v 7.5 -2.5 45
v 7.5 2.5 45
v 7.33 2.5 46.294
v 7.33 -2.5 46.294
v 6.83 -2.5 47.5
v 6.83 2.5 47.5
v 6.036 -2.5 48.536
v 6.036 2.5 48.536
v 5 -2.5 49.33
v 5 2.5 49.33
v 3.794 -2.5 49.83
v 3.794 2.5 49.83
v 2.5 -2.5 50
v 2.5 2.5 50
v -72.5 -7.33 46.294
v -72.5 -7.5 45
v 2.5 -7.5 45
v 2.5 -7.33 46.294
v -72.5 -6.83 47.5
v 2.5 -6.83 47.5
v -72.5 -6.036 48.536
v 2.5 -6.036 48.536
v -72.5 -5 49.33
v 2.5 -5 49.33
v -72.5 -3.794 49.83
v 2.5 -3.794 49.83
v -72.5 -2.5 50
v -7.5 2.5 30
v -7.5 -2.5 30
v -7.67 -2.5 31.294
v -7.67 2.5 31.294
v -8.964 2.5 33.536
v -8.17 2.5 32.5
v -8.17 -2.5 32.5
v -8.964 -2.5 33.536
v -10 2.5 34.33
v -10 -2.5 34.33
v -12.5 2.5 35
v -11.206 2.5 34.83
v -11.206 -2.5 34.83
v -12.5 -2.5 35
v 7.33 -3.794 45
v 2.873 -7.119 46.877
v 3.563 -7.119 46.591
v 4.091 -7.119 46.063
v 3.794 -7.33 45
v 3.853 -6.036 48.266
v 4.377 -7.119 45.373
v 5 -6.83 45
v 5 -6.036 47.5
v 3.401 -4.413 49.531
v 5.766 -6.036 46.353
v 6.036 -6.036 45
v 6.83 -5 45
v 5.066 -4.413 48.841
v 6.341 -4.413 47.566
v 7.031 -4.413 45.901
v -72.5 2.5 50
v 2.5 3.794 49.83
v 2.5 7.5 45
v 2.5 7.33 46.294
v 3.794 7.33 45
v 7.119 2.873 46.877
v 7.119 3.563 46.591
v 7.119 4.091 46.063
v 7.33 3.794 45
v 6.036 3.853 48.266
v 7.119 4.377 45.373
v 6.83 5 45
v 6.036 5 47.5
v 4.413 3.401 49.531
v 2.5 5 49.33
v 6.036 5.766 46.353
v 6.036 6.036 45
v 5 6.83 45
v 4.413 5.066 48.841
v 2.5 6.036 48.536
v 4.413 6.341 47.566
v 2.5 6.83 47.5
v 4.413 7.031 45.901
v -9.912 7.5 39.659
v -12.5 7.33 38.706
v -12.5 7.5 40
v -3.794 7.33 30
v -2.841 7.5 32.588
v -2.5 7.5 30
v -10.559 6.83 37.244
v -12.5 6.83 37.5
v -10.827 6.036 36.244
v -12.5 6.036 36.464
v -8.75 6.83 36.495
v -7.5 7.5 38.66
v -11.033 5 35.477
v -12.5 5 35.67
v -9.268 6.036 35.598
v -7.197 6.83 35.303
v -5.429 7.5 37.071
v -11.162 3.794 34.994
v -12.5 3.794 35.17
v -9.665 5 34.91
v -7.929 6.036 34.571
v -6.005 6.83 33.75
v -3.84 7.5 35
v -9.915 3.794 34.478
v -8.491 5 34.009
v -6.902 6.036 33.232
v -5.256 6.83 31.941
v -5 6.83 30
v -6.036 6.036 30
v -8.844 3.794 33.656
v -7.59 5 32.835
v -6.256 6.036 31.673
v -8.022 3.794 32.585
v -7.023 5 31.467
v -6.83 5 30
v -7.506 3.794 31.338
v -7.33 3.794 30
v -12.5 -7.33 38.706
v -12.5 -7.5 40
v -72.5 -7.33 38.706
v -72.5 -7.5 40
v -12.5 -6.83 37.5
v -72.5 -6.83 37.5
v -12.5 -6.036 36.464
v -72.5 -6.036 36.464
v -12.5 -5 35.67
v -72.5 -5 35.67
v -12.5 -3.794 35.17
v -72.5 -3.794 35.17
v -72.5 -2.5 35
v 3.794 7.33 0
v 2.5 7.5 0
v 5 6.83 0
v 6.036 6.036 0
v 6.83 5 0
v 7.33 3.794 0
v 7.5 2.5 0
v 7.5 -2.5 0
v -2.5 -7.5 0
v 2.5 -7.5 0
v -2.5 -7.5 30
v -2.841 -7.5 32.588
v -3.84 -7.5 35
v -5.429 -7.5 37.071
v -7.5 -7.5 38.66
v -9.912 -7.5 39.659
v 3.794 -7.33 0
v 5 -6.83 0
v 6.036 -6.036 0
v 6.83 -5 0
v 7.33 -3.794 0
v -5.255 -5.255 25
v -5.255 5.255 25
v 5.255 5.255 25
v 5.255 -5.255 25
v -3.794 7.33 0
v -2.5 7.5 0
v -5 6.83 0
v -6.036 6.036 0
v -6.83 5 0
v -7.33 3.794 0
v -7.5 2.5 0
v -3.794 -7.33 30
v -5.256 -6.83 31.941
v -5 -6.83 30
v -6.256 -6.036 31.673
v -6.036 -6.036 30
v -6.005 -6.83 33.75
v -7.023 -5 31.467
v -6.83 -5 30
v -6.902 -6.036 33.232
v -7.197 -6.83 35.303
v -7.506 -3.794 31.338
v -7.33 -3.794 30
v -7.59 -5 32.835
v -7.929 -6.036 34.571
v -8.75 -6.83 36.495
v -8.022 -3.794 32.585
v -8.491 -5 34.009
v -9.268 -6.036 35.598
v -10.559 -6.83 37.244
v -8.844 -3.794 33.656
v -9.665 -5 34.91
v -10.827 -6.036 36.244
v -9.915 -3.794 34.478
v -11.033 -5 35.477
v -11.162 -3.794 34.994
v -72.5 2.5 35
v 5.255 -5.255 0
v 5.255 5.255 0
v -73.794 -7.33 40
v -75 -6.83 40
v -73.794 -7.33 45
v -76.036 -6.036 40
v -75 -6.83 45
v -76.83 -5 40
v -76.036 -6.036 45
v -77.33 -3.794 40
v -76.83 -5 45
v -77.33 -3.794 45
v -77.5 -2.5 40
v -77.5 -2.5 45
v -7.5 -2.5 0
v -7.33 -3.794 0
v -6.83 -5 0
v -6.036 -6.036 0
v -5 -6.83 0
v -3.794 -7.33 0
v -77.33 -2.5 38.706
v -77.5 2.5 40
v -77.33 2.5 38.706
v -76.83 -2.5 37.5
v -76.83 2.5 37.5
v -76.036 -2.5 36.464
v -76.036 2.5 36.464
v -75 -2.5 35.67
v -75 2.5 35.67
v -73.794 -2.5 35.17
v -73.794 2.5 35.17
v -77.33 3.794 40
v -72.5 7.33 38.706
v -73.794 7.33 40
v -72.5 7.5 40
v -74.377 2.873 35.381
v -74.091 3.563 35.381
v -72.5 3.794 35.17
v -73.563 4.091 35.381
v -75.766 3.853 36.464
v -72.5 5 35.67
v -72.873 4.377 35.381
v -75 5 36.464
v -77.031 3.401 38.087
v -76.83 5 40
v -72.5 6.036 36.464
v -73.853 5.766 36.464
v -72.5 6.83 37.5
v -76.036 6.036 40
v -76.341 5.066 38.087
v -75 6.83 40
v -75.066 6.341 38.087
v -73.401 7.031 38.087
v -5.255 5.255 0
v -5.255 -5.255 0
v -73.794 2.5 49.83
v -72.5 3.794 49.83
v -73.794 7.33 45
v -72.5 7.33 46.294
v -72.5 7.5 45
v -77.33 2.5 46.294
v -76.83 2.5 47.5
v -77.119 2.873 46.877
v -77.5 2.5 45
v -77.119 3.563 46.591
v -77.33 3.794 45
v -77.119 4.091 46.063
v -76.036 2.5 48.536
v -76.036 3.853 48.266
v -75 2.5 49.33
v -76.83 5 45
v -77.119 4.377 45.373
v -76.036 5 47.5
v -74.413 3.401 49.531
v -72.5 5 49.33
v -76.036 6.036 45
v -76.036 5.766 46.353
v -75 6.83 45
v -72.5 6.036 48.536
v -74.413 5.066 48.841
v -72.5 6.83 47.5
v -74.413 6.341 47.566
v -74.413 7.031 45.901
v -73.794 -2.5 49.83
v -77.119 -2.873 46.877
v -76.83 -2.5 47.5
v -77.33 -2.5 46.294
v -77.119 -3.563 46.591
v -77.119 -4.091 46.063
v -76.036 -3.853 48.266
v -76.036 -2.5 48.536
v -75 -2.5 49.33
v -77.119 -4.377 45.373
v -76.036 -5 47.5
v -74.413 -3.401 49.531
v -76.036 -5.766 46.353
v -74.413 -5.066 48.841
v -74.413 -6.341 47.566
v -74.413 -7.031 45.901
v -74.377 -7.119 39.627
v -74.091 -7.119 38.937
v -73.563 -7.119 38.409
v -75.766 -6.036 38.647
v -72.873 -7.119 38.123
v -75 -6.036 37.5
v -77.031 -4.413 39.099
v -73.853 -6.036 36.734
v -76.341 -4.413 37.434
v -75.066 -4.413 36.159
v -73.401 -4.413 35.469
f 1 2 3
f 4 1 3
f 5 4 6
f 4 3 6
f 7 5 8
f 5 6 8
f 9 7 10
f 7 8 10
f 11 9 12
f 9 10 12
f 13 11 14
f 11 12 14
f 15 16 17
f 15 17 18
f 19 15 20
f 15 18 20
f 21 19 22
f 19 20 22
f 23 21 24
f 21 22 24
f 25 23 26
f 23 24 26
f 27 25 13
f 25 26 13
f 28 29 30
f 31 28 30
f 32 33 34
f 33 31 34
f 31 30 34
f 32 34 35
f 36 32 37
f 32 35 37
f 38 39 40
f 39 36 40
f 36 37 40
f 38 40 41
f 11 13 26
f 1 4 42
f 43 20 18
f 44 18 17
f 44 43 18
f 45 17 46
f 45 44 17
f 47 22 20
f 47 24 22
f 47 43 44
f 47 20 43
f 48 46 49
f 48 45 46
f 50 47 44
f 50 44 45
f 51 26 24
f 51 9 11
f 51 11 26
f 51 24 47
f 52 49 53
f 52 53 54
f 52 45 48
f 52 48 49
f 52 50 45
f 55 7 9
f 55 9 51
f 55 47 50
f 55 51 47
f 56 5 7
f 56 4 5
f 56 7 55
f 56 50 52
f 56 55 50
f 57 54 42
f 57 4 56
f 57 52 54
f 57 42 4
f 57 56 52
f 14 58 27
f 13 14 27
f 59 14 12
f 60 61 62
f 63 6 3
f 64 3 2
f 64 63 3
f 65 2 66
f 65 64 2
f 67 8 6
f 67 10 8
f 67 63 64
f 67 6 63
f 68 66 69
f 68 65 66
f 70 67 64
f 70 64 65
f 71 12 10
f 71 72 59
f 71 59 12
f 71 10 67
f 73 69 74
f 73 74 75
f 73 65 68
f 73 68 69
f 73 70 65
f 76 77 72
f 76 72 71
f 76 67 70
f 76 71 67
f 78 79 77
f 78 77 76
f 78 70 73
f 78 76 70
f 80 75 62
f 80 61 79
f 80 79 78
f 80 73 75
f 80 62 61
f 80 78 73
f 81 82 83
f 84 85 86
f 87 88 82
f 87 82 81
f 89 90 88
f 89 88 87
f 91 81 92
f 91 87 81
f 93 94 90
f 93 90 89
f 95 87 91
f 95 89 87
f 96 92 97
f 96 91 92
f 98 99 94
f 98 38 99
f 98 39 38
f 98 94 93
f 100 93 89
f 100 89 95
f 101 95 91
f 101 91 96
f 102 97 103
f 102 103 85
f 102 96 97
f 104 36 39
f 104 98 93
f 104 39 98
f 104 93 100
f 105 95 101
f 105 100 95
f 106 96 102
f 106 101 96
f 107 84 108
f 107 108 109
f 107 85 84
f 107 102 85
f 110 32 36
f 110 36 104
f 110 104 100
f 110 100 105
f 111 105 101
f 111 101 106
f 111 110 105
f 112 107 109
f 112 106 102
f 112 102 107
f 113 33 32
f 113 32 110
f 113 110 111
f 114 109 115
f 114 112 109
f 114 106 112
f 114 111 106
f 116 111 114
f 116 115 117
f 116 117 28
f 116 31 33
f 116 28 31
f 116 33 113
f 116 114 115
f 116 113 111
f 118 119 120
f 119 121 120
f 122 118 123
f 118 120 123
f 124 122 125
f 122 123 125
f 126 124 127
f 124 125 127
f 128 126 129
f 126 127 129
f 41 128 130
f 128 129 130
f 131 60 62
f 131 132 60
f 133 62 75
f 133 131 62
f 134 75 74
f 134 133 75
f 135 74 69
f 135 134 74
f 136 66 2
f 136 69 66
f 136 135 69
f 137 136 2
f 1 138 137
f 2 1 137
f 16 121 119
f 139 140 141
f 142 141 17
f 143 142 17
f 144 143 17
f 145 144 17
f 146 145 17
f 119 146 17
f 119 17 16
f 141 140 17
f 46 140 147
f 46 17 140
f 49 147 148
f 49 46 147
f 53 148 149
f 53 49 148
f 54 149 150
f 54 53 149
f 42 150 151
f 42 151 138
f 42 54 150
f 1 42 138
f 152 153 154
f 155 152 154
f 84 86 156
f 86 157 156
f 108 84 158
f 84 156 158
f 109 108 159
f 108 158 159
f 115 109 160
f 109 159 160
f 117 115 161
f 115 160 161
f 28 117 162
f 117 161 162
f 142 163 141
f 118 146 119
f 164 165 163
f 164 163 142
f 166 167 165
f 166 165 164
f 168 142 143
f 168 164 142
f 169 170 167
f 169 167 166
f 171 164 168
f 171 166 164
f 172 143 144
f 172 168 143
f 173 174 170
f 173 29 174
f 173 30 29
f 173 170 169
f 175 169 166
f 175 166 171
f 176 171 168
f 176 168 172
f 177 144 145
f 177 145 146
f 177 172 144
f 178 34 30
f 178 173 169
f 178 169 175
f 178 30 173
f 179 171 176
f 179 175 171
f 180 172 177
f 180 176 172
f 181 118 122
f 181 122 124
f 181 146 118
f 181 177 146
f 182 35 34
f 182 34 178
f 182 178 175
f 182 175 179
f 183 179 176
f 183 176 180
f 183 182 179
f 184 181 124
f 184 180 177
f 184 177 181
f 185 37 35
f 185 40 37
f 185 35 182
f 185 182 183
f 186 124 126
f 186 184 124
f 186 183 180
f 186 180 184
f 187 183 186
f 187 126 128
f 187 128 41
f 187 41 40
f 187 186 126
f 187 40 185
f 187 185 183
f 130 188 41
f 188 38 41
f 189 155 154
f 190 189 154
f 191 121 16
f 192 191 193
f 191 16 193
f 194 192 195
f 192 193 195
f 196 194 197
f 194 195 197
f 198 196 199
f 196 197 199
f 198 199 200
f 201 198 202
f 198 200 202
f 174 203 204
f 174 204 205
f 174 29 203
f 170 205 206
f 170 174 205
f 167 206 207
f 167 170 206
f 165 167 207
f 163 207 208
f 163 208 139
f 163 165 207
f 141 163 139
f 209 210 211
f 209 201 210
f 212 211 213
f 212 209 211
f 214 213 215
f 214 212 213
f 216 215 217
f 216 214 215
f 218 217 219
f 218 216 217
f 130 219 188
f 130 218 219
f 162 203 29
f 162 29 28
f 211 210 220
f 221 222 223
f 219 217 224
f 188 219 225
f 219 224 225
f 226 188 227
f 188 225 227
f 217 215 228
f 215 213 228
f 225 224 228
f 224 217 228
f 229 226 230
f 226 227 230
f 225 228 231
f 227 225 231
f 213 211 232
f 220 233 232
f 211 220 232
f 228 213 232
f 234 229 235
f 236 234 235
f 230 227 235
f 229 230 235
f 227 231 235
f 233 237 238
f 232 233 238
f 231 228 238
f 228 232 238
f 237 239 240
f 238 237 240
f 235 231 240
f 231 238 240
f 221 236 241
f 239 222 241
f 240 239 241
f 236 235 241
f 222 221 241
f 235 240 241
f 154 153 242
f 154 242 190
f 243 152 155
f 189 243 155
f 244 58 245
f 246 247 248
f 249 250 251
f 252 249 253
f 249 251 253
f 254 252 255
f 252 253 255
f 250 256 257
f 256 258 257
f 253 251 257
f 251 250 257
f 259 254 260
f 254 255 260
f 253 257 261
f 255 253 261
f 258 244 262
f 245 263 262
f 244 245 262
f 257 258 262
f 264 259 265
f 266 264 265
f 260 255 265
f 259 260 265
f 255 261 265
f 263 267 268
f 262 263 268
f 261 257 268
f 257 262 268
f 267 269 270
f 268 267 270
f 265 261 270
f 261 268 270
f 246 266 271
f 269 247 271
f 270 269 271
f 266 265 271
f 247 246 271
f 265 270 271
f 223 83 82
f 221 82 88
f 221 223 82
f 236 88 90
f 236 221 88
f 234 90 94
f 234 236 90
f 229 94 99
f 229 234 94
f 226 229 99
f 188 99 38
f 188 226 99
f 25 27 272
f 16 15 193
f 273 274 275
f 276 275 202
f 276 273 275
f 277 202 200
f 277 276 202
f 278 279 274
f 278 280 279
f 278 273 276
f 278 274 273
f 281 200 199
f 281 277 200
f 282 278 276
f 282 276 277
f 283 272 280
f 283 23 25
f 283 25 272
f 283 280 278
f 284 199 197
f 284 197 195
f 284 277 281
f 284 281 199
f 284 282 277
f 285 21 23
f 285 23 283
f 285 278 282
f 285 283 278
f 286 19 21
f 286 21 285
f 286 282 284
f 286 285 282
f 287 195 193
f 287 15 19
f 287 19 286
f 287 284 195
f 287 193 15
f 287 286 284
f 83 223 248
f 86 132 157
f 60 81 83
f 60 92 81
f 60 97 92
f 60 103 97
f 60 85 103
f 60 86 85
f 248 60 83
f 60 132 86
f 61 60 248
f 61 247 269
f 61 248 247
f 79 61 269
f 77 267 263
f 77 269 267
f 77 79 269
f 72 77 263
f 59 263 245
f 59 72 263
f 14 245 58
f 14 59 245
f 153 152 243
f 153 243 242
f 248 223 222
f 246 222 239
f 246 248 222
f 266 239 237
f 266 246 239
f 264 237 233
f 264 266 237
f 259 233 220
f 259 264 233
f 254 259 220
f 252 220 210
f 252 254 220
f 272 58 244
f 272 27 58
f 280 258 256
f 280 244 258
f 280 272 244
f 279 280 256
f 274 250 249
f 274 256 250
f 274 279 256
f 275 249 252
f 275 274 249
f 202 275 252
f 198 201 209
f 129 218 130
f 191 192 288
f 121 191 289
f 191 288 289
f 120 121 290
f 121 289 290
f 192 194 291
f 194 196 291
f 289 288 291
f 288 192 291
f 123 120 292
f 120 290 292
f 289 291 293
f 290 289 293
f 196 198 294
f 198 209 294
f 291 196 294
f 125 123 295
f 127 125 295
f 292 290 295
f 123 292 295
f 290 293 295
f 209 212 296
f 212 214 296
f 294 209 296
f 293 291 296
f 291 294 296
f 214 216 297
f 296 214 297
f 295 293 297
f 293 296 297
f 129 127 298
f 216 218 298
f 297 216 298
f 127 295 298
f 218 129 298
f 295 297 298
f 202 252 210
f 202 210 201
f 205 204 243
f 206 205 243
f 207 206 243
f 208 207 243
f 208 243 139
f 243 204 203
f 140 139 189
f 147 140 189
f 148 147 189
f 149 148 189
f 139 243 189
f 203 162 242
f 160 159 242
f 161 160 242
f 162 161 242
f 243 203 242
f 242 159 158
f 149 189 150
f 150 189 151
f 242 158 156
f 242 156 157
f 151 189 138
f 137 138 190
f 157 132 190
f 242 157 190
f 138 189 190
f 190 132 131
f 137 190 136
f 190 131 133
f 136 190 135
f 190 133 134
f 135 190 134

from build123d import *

# Parameters (mm, degrees)
F0_W     = 15
F0_H     = 15
F0_W_2   = 10.51
F0_H_2   = 10.51
F1_DEPTH = 25
F2_W     = 15
F2_H     = 15
F3_DEPTH = 25
F4_W     = 15
F4_H     = 15
F5_DEPTH = 70
F6_R     = 5


with BuildPart() as f1:
    # F0 (on Top) → F1 (new body)
    with BuildSketch(Plane.XY):
        Rectangle(F0_W, F0_H)
        Rectangle(F0_W_2, F0_H_2, mode=Mode.SUBTRACT)
    extrude(amount=F1_DEPTH)

    # F2 (on face) → F3 (join)
    with BuildSketch(Plane.XY.offset(25)):
        Rectangle(F2_W, F2_H)
    extrude(amount=F3_DEPTH)

    # F4 (on face) → F5 (join)
    with BuildSketch(Plane(origin=(-7.5, 0, 0), x_dir=(0, -1, 0), z_dir=(-1, 0, 0))):
        with Locations((0, 42.5)):
            Rectangle(F4_W, F4_H)
    extrude(amount=F5_DEPTH)

    # F6
    f6_edges = [f1.edges().sort_by_distance(p)[0] for p in [
        (-35, 7.5, 50),
        (7.5, 0, 50),
        (-35, -7.5, 50),
        (7.5, -7.5, 25),
        (7.5, 7.5, 25),
        (-77.5, 0, 50),
        (-77.5, 7.5, 42.5),
        (-77.5, 0, 35),
        (-77.5, -7.5, 42.5),
        (-42.5, 7.5, 35),
        (-7.5, 7.5, 17.5),
        (-7.5, -7.5, 17.5),
        (-42.5, -7.5, 35),
        (-7.5, 0, 35),
    ]]
    fillet(f6_edges, radius=F6_R)


solid = f1.part
